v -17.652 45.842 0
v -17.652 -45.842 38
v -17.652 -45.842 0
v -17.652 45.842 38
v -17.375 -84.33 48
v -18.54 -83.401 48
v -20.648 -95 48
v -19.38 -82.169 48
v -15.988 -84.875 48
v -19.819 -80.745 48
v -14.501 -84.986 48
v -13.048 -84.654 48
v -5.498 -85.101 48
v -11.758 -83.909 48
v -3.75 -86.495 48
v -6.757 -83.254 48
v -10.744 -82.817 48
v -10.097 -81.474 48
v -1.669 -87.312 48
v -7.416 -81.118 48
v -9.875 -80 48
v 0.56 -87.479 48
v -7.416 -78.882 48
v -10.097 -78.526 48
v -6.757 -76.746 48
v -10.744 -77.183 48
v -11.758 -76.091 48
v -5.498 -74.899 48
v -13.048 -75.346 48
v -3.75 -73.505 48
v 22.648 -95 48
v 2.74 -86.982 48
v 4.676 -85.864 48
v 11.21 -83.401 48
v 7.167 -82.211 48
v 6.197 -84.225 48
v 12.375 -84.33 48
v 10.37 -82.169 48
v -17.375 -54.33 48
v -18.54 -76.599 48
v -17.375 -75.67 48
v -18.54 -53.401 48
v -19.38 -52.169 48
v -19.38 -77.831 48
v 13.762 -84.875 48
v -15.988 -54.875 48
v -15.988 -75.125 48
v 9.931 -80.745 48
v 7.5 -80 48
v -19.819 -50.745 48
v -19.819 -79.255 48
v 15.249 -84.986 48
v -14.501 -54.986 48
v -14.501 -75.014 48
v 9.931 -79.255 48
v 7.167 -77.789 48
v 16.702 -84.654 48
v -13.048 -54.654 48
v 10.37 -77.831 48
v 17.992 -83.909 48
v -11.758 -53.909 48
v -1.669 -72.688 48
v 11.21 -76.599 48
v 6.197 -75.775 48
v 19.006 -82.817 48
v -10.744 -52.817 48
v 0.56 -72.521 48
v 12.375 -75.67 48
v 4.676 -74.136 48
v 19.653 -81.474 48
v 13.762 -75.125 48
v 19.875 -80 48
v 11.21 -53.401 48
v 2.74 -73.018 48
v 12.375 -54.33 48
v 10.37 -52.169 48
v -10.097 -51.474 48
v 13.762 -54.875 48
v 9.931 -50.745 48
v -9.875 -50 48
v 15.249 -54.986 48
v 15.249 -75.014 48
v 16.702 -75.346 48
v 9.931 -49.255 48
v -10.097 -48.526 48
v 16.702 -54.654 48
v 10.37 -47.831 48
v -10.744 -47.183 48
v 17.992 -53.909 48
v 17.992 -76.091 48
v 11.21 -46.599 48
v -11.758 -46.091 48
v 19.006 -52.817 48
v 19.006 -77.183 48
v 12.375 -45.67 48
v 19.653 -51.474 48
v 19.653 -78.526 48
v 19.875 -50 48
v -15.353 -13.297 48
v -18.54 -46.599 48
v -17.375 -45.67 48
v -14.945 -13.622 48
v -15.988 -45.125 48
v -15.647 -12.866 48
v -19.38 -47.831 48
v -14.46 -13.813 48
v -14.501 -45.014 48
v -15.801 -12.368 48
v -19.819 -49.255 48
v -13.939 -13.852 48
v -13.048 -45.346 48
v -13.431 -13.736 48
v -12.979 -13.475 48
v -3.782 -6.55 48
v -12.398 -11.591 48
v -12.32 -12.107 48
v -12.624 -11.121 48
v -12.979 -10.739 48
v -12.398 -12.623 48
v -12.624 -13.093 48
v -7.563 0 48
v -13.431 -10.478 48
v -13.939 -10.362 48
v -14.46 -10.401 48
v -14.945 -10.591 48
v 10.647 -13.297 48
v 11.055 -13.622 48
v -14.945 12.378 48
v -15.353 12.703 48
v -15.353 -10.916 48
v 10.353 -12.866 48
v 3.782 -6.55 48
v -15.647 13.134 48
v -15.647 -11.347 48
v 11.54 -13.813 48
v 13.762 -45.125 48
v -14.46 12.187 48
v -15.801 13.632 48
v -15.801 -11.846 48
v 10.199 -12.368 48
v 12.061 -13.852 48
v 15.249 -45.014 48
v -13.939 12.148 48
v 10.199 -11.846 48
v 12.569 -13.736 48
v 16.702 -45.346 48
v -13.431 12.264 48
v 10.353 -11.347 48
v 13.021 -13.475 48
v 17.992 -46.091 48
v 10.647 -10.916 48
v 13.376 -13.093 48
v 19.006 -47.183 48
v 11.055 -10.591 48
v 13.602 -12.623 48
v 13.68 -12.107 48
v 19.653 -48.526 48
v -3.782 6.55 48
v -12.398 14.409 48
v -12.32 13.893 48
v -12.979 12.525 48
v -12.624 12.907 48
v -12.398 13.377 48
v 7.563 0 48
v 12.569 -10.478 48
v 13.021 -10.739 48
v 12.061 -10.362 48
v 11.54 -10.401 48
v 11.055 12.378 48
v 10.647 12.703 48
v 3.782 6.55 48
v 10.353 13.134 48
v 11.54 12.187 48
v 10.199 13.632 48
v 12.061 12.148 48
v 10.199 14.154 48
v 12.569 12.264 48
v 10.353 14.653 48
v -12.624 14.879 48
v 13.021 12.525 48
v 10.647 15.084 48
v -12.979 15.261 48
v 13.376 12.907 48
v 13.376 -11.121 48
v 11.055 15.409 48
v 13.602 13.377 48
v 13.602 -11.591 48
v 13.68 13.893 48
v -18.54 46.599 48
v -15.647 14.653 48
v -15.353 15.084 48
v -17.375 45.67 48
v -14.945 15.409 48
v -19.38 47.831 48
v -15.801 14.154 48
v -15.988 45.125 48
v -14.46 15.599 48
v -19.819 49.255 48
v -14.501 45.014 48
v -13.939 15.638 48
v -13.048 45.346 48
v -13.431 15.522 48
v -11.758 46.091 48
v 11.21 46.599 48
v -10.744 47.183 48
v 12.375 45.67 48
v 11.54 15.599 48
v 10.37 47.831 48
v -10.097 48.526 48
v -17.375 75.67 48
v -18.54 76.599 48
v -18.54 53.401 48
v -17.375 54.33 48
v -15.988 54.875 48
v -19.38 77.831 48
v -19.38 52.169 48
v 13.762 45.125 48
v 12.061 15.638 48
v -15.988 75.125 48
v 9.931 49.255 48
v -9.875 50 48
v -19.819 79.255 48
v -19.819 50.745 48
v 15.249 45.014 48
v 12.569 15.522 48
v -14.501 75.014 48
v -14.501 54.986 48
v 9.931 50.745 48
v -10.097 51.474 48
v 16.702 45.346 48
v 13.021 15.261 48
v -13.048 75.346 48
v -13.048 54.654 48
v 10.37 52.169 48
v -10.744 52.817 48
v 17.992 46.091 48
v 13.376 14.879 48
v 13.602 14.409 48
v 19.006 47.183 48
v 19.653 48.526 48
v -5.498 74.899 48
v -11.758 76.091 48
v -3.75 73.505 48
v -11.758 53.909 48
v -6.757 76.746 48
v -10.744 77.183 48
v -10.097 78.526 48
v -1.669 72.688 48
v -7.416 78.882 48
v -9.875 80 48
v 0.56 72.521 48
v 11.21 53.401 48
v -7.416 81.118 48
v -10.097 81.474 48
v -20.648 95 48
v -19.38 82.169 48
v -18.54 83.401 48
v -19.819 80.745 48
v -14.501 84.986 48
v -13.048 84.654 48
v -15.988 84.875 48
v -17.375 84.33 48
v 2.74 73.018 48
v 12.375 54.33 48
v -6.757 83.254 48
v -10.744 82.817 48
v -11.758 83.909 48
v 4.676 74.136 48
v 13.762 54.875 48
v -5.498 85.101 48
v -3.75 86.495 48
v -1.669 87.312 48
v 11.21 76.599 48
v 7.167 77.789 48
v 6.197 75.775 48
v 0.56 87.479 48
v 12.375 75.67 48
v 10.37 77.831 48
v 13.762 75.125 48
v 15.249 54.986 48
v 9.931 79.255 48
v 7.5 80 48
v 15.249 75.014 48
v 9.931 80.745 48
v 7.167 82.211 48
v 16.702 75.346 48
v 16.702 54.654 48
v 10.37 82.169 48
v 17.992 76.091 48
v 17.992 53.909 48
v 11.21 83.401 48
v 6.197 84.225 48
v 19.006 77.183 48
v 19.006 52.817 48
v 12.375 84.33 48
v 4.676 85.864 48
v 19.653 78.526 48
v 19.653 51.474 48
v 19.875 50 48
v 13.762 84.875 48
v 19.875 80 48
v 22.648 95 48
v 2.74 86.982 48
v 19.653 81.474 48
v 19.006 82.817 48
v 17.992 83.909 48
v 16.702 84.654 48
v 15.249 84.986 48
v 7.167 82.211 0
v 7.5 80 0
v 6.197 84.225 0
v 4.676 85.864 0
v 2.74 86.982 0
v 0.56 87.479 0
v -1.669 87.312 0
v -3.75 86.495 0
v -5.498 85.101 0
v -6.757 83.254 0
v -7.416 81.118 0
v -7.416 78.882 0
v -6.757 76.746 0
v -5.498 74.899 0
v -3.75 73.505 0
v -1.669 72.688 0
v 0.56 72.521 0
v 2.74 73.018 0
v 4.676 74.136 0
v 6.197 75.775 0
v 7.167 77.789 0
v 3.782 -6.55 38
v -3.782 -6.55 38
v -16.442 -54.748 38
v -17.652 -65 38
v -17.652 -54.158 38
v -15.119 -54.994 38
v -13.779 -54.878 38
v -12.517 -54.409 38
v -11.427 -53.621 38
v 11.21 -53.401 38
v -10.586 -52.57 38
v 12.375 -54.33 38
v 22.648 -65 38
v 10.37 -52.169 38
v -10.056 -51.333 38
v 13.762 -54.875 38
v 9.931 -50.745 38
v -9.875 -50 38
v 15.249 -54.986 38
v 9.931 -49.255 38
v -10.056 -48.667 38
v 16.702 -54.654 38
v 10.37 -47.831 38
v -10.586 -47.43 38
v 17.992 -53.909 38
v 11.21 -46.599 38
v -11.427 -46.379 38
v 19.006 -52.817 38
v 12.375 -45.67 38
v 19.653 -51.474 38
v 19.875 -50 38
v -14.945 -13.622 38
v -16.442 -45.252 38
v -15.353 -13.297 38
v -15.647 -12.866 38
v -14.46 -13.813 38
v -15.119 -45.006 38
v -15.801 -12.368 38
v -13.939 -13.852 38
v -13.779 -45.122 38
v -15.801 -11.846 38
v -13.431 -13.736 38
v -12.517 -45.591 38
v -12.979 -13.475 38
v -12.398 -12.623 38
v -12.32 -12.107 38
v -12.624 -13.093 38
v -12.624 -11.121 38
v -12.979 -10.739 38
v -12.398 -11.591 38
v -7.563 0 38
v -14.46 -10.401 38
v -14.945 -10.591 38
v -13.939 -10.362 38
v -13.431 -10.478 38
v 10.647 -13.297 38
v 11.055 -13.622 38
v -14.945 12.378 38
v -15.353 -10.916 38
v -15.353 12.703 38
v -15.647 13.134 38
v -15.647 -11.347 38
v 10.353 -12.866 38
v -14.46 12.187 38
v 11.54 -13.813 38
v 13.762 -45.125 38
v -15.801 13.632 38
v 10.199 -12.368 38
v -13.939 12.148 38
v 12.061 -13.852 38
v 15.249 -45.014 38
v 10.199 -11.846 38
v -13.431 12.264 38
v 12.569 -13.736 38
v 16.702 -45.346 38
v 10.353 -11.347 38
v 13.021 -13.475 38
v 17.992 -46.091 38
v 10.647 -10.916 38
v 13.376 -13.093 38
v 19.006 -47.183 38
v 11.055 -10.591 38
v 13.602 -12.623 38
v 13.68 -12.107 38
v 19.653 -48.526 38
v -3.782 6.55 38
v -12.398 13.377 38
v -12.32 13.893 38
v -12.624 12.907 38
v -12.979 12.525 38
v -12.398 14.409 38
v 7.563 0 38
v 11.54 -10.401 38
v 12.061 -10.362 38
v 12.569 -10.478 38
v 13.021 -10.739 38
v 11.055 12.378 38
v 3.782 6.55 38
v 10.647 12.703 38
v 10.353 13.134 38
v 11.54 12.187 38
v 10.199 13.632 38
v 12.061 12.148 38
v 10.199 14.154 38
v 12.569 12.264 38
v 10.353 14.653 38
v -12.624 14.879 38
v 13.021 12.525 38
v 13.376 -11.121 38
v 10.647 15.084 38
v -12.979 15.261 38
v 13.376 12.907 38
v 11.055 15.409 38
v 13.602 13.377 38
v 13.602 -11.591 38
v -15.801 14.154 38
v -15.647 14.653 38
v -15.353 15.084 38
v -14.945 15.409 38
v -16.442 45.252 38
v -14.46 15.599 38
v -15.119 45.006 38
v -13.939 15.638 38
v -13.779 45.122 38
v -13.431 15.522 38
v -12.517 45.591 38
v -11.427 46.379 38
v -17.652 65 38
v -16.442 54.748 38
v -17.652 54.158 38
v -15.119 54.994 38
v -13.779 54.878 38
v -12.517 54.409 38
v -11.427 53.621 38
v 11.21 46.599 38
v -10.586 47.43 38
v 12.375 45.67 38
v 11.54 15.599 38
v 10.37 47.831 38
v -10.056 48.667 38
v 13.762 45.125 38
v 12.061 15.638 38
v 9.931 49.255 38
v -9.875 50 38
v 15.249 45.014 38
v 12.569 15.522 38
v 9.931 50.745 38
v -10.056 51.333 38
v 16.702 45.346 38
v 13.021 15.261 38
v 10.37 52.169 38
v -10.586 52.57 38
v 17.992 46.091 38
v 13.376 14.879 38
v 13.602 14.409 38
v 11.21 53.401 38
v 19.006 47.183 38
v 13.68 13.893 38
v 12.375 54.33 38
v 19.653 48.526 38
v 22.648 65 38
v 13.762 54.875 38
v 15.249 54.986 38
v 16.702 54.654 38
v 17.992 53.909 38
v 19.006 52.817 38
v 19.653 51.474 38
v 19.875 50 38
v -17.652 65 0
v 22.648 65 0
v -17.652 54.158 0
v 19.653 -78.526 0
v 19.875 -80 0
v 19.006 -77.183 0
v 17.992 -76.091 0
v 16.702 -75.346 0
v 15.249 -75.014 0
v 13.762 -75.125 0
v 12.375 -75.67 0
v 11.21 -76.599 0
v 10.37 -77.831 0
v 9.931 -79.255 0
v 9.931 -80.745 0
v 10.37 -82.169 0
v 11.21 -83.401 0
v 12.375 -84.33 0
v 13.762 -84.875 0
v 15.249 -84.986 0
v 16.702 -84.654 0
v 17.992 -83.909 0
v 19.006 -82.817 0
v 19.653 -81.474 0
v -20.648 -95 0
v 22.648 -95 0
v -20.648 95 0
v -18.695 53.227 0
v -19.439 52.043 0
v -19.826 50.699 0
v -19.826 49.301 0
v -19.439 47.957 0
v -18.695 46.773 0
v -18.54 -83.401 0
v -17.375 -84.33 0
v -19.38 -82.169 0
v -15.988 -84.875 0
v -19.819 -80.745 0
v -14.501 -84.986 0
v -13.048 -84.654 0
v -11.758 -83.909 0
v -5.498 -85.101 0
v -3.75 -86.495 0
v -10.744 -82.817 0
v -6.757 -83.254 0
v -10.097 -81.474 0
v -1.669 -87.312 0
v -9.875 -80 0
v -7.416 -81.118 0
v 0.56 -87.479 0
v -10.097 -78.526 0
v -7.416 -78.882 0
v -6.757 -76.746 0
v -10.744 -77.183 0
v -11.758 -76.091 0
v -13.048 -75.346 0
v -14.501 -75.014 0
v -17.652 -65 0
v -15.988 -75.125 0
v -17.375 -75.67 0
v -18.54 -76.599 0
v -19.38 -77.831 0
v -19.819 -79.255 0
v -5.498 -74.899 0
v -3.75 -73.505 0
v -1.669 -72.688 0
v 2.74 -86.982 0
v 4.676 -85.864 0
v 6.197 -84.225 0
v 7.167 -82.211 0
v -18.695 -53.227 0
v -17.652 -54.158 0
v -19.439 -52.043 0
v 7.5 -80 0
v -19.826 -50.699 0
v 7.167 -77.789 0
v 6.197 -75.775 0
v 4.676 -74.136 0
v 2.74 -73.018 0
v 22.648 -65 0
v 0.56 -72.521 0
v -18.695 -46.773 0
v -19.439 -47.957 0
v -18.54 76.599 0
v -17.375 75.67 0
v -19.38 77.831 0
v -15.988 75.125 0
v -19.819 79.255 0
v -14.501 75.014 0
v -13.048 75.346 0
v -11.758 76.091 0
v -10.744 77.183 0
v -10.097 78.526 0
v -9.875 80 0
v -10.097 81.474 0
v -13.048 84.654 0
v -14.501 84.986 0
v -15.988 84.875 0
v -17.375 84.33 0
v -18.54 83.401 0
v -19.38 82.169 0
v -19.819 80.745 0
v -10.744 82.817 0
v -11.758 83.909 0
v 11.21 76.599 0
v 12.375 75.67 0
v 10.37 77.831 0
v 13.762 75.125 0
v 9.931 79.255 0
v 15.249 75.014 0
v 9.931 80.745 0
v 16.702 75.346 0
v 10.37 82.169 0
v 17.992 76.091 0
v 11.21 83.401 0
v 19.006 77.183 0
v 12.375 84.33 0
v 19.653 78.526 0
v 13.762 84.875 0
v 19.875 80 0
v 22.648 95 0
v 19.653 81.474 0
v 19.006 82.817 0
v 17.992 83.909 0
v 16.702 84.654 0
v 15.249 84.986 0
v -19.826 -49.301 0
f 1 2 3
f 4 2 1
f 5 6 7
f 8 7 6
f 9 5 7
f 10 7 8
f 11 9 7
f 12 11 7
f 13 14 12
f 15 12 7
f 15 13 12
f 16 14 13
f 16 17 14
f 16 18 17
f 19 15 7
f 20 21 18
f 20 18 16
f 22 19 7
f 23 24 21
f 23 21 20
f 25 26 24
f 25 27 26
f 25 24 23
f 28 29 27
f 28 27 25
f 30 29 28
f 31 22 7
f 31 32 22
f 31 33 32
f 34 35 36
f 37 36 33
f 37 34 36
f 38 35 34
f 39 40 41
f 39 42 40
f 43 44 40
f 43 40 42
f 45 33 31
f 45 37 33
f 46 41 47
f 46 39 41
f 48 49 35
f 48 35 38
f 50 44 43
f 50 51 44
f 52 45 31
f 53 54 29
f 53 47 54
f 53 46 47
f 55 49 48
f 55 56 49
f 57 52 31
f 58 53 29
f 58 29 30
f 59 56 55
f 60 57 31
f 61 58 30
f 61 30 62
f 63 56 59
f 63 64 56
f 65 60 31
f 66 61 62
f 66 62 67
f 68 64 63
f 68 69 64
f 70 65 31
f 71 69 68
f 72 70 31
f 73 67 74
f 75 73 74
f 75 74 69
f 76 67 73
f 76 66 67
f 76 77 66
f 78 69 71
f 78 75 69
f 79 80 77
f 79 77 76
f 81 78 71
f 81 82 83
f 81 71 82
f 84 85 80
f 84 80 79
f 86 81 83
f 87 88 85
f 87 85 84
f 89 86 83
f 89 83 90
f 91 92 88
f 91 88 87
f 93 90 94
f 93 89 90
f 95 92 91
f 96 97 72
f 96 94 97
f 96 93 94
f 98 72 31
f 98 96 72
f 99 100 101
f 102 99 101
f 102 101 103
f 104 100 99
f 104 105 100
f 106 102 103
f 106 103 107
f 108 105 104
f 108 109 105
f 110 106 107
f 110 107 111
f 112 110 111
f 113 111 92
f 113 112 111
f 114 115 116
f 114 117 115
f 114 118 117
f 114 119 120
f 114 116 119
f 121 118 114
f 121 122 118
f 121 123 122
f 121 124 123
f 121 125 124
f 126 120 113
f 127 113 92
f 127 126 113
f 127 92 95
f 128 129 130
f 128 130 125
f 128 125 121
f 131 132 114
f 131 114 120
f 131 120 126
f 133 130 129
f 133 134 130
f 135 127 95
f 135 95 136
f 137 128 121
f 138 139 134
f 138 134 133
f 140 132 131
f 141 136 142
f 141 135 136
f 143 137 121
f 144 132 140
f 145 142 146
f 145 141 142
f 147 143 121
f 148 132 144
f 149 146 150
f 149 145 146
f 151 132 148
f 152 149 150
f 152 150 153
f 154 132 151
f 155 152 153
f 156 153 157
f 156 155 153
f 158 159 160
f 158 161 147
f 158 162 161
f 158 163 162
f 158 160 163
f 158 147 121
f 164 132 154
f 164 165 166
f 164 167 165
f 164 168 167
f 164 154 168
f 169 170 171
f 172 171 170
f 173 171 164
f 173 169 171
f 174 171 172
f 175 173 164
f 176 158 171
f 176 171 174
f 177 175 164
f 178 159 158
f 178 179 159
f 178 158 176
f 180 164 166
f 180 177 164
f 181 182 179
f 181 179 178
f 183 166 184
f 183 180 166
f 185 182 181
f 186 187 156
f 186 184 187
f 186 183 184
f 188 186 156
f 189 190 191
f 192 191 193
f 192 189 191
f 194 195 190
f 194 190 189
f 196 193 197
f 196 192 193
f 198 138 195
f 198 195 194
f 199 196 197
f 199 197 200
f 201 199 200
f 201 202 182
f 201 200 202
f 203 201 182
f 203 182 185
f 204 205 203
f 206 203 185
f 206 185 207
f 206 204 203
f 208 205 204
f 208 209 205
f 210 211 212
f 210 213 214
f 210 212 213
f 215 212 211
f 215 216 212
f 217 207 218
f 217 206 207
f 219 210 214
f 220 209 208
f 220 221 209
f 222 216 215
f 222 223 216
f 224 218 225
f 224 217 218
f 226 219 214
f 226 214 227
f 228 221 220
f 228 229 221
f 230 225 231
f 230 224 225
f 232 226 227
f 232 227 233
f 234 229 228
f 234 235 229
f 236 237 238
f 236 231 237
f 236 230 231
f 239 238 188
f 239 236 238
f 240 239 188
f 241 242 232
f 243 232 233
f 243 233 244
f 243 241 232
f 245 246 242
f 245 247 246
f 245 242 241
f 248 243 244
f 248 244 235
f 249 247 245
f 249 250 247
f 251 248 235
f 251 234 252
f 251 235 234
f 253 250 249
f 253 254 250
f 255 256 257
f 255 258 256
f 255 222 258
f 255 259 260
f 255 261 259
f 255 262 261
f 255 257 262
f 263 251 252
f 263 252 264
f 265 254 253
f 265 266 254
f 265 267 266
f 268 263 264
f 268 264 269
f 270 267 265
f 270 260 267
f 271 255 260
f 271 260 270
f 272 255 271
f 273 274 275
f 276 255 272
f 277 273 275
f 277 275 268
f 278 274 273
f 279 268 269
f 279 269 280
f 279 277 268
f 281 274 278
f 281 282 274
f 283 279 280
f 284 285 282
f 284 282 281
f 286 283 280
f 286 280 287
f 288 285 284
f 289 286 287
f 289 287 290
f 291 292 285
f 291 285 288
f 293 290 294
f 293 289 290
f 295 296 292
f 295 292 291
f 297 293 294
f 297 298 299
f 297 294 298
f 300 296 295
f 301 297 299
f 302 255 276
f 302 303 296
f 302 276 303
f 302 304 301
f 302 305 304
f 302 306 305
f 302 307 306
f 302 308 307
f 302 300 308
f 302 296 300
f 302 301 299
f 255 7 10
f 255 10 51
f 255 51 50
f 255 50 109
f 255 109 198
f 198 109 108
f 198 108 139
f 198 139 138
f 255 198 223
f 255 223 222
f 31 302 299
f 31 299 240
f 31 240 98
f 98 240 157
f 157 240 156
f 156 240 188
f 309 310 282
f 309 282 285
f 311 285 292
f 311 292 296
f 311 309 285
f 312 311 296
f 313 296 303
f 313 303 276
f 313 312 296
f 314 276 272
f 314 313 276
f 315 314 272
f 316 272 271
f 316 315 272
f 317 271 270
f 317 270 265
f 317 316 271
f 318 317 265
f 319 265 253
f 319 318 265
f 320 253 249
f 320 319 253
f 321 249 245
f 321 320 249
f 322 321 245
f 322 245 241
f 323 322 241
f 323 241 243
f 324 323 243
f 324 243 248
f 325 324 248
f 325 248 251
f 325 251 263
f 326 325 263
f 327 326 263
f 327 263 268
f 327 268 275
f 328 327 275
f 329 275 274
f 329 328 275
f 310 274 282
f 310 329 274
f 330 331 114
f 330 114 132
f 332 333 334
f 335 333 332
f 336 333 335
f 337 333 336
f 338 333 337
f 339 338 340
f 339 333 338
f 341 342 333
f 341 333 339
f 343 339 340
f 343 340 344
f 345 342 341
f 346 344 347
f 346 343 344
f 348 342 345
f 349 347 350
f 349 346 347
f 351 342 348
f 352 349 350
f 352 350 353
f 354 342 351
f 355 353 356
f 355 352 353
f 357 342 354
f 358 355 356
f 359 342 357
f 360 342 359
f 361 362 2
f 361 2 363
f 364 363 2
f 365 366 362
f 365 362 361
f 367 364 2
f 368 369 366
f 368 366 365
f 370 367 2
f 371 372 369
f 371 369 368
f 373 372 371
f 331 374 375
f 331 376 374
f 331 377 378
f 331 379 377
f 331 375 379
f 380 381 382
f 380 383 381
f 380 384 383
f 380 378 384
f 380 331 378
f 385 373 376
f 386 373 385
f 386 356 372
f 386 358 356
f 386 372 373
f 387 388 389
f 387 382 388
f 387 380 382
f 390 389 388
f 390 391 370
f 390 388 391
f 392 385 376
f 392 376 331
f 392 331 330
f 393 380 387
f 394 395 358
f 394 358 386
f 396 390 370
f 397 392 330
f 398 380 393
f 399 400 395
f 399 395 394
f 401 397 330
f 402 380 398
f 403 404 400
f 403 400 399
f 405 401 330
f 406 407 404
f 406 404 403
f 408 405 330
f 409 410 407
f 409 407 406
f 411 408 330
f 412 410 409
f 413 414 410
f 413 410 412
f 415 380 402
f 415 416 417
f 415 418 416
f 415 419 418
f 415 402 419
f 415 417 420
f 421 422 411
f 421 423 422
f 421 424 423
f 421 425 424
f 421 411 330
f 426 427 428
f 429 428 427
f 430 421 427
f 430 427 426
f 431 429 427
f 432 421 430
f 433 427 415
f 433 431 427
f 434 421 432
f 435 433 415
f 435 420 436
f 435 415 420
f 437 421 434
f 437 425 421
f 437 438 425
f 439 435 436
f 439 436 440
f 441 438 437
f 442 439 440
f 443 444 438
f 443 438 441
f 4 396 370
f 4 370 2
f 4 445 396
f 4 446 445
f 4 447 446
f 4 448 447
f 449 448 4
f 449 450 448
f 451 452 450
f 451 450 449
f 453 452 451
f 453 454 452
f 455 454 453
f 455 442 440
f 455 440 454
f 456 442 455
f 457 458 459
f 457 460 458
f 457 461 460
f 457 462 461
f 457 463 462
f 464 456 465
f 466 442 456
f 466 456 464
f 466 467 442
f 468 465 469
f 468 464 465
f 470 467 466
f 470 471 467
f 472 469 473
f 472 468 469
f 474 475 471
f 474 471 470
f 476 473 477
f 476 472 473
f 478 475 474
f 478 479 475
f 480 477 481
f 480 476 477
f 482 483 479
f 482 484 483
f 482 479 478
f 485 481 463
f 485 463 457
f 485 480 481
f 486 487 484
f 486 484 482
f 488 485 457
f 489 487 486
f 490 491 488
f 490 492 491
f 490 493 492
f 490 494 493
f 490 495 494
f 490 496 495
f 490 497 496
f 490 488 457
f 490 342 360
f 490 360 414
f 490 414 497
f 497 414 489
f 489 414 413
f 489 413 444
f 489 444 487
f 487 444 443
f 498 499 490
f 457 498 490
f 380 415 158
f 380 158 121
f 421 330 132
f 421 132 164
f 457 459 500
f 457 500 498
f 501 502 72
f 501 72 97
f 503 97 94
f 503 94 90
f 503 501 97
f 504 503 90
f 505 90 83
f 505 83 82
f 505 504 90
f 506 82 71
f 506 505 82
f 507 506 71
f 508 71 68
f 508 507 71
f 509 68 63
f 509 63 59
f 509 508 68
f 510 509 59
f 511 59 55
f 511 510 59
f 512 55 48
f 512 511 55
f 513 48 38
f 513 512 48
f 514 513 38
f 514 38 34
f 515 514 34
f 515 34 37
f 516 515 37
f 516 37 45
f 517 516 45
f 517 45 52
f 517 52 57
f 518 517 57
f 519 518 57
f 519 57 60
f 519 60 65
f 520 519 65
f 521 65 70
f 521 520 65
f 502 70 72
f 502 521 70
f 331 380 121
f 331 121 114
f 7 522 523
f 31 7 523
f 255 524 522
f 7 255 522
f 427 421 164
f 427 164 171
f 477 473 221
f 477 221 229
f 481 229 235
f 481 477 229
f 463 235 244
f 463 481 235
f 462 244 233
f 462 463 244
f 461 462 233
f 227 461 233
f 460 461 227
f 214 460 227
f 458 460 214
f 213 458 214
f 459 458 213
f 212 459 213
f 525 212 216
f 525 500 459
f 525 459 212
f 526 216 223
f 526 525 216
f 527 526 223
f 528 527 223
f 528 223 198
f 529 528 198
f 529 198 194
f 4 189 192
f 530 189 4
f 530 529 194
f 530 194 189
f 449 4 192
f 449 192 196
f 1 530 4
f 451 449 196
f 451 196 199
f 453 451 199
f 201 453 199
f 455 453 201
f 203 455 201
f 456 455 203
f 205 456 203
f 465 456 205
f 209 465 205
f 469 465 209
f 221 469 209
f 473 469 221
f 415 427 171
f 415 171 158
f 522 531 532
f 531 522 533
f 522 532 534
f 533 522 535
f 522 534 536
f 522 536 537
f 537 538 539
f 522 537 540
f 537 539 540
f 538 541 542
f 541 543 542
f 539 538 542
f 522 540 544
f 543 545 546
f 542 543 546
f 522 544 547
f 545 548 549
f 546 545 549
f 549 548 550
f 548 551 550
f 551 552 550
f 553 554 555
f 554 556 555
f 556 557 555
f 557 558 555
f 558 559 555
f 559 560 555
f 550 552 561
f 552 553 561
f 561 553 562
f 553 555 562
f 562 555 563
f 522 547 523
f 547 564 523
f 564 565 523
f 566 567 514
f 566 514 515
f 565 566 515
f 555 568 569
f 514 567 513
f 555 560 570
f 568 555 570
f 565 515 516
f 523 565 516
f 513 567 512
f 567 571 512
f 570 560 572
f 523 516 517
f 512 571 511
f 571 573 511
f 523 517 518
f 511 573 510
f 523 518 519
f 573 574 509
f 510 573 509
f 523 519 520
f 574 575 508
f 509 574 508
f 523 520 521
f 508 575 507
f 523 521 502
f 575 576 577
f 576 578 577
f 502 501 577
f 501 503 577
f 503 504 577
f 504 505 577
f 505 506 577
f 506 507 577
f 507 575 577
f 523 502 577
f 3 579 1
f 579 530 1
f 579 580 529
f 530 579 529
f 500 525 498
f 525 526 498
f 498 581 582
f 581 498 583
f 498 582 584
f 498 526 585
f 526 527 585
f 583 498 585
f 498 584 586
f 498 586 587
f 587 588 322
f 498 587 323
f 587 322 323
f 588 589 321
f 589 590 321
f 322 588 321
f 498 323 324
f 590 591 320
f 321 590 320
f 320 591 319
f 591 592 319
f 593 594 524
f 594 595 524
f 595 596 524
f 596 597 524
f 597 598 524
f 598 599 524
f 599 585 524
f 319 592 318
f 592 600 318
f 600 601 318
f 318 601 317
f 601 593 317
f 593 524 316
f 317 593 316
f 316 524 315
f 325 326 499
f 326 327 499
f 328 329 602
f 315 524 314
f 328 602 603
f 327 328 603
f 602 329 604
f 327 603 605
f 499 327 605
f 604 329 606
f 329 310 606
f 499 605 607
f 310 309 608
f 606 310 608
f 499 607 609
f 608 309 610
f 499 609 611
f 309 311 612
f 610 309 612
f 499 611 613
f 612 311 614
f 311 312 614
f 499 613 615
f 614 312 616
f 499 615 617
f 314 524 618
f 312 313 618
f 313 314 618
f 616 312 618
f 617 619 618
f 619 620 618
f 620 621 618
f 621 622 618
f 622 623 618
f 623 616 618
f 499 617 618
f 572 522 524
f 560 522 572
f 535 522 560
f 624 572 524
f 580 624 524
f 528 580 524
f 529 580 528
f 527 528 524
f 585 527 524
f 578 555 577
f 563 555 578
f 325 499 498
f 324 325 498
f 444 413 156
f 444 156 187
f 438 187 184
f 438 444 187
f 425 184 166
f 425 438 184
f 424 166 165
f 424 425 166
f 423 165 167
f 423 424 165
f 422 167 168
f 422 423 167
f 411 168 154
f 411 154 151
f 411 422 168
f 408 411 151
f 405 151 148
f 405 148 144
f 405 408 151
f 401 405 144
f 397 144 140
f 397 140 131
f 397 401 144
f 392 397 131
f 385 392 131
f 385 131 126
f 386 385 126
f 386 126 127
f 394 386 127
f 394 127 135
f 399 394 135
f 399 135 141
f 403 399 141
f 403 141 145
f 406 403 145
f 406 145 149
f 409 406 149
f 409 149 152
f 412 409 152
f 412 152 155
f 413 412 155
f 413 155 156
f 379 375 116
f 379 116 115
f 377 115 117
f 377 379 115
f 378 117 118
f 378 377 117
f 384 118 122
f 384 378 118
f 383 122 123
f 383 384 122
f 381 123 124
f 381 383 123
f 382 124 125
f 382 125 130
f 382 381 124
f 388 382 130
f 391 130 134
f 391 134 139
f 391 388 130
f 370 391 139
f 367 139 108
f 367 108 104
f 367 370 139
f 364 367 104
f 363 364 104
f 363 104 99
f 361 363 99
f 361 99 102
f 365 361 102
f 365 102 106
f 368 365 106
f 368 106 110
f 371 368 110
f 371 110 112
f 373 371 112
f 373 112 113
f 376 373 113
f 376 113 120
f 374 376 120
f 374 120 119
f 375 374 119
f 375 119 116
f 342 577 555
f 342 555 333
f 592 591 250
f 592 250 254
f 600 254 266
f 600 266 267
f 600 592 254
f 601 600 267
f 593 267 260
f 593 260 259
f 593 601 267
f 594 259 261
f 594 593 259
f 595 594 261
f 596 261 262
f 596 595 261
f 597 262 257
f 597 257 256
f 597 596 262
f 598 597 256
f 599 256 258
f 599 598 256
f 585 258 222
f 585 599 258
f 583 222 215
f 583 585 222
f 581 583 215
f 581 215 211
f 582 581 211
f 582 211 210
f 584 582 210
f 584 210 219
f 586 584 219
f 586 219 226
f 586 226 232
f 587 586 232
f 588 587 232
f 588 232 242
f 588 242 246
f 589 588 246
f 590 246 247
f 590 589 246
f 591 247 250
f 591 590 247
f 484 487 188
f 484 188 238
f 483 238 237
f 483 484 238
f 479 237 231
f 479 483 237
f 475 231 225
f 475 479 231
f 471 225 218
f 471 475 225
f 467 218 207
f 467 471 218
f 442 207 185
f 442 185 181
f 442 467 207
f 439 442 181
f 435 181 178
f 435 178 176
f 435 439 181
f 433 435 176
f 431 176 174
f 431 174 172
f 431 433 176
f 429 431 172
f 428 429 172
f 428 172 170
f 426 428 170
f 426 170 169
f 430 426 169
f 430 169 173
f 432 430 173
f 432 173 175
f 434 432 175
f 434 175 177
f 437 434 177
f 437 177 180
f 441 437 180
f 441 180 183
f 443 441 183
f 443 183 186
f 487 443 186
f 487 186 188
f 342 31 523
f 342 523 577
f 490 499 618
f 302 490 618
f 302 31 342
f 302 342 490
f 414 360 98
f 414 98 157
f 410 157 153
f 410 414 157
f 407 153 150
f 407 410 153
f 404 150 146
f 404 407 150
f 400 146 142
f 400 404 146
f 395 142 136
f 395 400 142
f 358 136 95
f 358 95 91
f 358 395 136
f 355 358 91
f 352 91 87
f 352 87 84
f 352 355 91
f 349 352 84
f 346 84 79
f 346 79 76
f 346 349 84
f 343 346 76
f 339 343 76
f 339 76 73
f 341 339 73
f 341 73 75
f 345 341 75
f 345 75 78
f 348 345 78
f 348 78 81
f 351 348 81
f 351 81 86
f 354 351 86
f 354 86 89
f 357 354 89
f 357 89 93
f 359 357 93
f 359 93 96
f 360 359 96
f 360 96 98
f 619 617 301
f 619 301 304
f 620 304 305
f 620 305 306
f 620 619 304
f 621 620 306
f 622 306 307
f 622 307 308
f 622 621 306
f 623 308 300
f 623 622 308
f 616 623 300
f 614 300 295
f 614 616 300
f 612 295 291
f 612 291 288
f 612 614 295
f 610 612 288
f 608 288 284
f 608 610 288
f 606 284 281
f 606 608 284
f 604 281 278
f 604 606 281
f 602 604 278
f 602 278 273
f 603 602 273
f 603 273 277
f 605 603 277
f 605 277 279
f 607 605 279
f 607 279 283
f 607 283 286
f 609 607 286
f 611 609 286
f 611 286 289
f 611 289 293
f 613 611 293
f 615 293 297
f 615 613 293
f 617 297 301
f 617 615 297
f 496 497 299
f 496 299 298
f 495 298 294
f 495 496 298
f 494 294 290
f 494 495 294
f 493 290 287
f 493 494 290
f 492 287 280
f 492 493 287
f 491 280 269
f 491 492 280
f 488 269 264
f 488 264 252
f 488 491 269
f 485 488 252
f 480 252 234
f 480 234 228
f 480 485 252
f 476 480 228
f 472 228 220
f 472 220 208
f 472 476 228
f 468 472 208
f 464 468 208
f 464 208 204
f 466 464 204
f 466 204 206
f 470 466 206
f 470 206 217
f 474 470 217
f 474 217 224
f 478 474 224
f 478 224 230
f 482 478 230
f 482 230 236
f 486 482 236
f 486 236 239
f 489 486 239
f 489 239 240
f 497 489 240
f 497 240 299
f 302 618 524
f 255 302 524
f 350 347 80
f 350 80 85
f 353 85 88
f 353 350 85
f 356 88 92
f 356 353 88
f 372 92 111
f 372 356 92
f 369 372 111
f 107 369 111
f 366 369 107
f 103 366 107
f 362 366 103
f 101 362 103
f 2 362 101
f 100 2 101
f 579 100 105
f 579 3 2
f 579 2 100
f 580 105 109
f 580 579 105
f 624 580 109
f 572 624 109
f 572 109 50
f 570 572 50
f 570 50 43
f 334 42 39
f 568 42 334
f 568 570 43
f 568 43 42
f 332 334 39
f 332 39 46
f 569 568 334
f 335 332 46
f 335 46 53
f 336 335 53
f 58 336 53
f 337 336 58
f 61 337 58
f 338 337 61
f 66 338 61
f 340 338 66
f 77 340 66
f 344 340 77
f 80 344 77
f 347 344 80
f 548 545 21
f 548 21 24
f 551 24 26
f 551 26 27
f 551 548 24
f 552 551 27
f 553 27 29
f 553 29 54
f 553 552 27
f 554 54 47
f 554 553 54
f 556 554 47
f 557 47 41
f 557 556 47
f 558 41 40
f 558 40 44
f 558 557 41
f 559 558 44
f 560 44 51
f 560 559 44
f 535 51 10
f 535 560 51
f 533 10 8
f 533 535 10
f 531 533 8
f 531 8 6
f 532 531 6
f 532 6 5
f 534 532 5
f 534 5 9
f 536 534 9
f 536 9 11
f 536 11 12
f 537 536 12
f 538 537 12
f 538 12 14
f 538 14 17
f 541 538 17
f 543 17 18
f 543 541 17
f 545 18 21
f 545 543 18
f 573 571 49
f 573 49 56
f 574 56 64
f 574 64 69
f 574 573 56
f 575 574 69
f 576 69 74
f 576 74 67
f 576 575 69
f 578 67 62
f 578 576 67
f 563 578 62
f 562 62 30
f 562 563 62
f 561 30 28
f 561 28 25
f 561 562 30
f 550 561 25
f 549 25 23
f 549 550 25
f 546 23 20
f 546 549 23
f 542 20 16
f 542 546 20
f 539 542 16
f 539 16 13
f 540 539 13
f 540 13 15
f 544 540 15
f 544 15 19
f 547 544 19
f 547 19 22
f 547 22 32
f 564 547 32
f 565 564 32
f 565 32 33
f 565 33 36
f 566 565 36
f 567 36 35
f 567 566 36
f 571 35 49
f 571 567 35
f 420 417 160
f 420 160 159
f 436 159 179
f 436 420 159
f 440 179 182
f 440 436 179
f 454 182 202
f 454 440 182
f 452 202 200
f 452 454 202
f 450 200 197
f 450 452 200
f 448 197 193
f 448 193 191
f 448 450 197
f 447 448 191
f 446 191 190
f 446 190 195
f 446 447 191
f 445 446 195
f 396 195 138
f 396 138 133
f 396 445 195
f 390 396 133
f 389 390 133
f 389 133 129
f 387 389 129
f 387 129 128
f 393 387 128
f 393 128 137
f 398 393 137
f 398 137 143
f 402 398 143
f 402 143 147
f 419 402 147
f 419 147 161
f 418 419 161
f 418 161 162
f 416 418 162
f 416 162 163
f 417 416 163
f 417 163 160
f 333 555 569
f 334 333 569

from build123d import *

# Parameters (mm, degrees)
F0_R     = 5
F0_R_2   = 7.5
F0_R_3   = 1.75
F2_DEPTH = 48
F3_DEPTH = 48
F4_W     = 130
F4_H     = 38
F5_DEPTH = 48.3
F6_W     = 8
F6_H     = 190
F7_DEPTH = 50


with BuildPart() as f2:
    # F0 (on Top) → F2 (new body)
    with BuildSketch(Plane.XY):
        Polygon((-20.6482383256, 95), (-20.6482383256, 17.5979303911), (-20.6482383256, 0), (-20.6482383256, -17.5979303911), (-20.6482383256, -95), (30.6482383256, -95), (30.6482383256, 0), (30.6482383256, 95), align=None)
        with Locations((-14.875, -80)):
            Circle(F0_R, mode=Mode.SUBTRACT)
        with Locations((-14.875, -50)):
            Circle(F0_R, mode=Mode.SUBTRACT)
        with Locations((0, -80)):
            Circle(F0_R_2, mode=Mode.SUBTRACT)
        with Locations((-14.0701553242, -12.1067194764)):
            Circle(F0_R_3, mode=Mode.SUBTRACT)
        with Locations((14.875, -80)):
            Circle(F0_R, mode=Mode.SUBTRACT)
        with Locations((14.875, -50)):
            Circle(F0_R, mode=Mode.SUBTRACT)
        with Locations((11.9298446758, -12.1067194764)):
            Circle(F0_R_3, mode=Mode.SUBTRACT)
        with Locations((-14.0701553242, 13.8932805236)):
            Circle(F0_R_3, mode=Mode.SUBTRACT)
        with Locations((-14.875, 50)):
            Circle(F0_R, mode=Mode.SUBTRACT)
        with Locations((-14.875, 80)):
            Circle(F0_R, mode=Mode.SUBTRACT)
        with Locations((0, 80)):
            Circle(F0_R_2, mode=Mode.SUBTRACT)
        with Locations((11.9298446758, 13.8932805236)):
            Circle(F0_R_3, mode=Mode.SUBTRACT)
        with Locations((14.875, 50)):
            Circle(F0_R, mode=Mode.SUBTRACT)
        with Locations((14.875, 80)):
            Circle(F0_R, mode=Mode.SUBTRACT)
    extrude(amount=F2_DEPTH)

    # F1 (on face) → F3 (cut)
    with BuildSketch(Plane.XY):
        Polygon((3.7816442632, 6.55), (-3.7816442632, 6.55), (-7.5632885264, 0), (-3.7816442632, -6.55), (3.7816442632, -6.55), (7.5632885264, 0), align=None)
    extrude(amount=F3_DEPTH, mode=Mode.SUBTRACT)

    # F4 (on face) → F5 (cut)
    with BuildSketch(Plane.YZ.offset(30.6482383256)):
        with Locations((0, 19)):
            Rectangle(F4_W, F4_H)
    extrude(amount=-F5_DEPTH, mode=Mode.SUBTRACT)

    # F6 (on face) → F7 (cut)
    with BuildSketch(Plane.XY.offset(48)):
        with Locations((26.6482383256, 0)):
            Rectangle(F6_W, F6_H)
    extrude(amount=-F7_DEPTH, mode=Mode.SUBTRACT)


solid = f2.part
